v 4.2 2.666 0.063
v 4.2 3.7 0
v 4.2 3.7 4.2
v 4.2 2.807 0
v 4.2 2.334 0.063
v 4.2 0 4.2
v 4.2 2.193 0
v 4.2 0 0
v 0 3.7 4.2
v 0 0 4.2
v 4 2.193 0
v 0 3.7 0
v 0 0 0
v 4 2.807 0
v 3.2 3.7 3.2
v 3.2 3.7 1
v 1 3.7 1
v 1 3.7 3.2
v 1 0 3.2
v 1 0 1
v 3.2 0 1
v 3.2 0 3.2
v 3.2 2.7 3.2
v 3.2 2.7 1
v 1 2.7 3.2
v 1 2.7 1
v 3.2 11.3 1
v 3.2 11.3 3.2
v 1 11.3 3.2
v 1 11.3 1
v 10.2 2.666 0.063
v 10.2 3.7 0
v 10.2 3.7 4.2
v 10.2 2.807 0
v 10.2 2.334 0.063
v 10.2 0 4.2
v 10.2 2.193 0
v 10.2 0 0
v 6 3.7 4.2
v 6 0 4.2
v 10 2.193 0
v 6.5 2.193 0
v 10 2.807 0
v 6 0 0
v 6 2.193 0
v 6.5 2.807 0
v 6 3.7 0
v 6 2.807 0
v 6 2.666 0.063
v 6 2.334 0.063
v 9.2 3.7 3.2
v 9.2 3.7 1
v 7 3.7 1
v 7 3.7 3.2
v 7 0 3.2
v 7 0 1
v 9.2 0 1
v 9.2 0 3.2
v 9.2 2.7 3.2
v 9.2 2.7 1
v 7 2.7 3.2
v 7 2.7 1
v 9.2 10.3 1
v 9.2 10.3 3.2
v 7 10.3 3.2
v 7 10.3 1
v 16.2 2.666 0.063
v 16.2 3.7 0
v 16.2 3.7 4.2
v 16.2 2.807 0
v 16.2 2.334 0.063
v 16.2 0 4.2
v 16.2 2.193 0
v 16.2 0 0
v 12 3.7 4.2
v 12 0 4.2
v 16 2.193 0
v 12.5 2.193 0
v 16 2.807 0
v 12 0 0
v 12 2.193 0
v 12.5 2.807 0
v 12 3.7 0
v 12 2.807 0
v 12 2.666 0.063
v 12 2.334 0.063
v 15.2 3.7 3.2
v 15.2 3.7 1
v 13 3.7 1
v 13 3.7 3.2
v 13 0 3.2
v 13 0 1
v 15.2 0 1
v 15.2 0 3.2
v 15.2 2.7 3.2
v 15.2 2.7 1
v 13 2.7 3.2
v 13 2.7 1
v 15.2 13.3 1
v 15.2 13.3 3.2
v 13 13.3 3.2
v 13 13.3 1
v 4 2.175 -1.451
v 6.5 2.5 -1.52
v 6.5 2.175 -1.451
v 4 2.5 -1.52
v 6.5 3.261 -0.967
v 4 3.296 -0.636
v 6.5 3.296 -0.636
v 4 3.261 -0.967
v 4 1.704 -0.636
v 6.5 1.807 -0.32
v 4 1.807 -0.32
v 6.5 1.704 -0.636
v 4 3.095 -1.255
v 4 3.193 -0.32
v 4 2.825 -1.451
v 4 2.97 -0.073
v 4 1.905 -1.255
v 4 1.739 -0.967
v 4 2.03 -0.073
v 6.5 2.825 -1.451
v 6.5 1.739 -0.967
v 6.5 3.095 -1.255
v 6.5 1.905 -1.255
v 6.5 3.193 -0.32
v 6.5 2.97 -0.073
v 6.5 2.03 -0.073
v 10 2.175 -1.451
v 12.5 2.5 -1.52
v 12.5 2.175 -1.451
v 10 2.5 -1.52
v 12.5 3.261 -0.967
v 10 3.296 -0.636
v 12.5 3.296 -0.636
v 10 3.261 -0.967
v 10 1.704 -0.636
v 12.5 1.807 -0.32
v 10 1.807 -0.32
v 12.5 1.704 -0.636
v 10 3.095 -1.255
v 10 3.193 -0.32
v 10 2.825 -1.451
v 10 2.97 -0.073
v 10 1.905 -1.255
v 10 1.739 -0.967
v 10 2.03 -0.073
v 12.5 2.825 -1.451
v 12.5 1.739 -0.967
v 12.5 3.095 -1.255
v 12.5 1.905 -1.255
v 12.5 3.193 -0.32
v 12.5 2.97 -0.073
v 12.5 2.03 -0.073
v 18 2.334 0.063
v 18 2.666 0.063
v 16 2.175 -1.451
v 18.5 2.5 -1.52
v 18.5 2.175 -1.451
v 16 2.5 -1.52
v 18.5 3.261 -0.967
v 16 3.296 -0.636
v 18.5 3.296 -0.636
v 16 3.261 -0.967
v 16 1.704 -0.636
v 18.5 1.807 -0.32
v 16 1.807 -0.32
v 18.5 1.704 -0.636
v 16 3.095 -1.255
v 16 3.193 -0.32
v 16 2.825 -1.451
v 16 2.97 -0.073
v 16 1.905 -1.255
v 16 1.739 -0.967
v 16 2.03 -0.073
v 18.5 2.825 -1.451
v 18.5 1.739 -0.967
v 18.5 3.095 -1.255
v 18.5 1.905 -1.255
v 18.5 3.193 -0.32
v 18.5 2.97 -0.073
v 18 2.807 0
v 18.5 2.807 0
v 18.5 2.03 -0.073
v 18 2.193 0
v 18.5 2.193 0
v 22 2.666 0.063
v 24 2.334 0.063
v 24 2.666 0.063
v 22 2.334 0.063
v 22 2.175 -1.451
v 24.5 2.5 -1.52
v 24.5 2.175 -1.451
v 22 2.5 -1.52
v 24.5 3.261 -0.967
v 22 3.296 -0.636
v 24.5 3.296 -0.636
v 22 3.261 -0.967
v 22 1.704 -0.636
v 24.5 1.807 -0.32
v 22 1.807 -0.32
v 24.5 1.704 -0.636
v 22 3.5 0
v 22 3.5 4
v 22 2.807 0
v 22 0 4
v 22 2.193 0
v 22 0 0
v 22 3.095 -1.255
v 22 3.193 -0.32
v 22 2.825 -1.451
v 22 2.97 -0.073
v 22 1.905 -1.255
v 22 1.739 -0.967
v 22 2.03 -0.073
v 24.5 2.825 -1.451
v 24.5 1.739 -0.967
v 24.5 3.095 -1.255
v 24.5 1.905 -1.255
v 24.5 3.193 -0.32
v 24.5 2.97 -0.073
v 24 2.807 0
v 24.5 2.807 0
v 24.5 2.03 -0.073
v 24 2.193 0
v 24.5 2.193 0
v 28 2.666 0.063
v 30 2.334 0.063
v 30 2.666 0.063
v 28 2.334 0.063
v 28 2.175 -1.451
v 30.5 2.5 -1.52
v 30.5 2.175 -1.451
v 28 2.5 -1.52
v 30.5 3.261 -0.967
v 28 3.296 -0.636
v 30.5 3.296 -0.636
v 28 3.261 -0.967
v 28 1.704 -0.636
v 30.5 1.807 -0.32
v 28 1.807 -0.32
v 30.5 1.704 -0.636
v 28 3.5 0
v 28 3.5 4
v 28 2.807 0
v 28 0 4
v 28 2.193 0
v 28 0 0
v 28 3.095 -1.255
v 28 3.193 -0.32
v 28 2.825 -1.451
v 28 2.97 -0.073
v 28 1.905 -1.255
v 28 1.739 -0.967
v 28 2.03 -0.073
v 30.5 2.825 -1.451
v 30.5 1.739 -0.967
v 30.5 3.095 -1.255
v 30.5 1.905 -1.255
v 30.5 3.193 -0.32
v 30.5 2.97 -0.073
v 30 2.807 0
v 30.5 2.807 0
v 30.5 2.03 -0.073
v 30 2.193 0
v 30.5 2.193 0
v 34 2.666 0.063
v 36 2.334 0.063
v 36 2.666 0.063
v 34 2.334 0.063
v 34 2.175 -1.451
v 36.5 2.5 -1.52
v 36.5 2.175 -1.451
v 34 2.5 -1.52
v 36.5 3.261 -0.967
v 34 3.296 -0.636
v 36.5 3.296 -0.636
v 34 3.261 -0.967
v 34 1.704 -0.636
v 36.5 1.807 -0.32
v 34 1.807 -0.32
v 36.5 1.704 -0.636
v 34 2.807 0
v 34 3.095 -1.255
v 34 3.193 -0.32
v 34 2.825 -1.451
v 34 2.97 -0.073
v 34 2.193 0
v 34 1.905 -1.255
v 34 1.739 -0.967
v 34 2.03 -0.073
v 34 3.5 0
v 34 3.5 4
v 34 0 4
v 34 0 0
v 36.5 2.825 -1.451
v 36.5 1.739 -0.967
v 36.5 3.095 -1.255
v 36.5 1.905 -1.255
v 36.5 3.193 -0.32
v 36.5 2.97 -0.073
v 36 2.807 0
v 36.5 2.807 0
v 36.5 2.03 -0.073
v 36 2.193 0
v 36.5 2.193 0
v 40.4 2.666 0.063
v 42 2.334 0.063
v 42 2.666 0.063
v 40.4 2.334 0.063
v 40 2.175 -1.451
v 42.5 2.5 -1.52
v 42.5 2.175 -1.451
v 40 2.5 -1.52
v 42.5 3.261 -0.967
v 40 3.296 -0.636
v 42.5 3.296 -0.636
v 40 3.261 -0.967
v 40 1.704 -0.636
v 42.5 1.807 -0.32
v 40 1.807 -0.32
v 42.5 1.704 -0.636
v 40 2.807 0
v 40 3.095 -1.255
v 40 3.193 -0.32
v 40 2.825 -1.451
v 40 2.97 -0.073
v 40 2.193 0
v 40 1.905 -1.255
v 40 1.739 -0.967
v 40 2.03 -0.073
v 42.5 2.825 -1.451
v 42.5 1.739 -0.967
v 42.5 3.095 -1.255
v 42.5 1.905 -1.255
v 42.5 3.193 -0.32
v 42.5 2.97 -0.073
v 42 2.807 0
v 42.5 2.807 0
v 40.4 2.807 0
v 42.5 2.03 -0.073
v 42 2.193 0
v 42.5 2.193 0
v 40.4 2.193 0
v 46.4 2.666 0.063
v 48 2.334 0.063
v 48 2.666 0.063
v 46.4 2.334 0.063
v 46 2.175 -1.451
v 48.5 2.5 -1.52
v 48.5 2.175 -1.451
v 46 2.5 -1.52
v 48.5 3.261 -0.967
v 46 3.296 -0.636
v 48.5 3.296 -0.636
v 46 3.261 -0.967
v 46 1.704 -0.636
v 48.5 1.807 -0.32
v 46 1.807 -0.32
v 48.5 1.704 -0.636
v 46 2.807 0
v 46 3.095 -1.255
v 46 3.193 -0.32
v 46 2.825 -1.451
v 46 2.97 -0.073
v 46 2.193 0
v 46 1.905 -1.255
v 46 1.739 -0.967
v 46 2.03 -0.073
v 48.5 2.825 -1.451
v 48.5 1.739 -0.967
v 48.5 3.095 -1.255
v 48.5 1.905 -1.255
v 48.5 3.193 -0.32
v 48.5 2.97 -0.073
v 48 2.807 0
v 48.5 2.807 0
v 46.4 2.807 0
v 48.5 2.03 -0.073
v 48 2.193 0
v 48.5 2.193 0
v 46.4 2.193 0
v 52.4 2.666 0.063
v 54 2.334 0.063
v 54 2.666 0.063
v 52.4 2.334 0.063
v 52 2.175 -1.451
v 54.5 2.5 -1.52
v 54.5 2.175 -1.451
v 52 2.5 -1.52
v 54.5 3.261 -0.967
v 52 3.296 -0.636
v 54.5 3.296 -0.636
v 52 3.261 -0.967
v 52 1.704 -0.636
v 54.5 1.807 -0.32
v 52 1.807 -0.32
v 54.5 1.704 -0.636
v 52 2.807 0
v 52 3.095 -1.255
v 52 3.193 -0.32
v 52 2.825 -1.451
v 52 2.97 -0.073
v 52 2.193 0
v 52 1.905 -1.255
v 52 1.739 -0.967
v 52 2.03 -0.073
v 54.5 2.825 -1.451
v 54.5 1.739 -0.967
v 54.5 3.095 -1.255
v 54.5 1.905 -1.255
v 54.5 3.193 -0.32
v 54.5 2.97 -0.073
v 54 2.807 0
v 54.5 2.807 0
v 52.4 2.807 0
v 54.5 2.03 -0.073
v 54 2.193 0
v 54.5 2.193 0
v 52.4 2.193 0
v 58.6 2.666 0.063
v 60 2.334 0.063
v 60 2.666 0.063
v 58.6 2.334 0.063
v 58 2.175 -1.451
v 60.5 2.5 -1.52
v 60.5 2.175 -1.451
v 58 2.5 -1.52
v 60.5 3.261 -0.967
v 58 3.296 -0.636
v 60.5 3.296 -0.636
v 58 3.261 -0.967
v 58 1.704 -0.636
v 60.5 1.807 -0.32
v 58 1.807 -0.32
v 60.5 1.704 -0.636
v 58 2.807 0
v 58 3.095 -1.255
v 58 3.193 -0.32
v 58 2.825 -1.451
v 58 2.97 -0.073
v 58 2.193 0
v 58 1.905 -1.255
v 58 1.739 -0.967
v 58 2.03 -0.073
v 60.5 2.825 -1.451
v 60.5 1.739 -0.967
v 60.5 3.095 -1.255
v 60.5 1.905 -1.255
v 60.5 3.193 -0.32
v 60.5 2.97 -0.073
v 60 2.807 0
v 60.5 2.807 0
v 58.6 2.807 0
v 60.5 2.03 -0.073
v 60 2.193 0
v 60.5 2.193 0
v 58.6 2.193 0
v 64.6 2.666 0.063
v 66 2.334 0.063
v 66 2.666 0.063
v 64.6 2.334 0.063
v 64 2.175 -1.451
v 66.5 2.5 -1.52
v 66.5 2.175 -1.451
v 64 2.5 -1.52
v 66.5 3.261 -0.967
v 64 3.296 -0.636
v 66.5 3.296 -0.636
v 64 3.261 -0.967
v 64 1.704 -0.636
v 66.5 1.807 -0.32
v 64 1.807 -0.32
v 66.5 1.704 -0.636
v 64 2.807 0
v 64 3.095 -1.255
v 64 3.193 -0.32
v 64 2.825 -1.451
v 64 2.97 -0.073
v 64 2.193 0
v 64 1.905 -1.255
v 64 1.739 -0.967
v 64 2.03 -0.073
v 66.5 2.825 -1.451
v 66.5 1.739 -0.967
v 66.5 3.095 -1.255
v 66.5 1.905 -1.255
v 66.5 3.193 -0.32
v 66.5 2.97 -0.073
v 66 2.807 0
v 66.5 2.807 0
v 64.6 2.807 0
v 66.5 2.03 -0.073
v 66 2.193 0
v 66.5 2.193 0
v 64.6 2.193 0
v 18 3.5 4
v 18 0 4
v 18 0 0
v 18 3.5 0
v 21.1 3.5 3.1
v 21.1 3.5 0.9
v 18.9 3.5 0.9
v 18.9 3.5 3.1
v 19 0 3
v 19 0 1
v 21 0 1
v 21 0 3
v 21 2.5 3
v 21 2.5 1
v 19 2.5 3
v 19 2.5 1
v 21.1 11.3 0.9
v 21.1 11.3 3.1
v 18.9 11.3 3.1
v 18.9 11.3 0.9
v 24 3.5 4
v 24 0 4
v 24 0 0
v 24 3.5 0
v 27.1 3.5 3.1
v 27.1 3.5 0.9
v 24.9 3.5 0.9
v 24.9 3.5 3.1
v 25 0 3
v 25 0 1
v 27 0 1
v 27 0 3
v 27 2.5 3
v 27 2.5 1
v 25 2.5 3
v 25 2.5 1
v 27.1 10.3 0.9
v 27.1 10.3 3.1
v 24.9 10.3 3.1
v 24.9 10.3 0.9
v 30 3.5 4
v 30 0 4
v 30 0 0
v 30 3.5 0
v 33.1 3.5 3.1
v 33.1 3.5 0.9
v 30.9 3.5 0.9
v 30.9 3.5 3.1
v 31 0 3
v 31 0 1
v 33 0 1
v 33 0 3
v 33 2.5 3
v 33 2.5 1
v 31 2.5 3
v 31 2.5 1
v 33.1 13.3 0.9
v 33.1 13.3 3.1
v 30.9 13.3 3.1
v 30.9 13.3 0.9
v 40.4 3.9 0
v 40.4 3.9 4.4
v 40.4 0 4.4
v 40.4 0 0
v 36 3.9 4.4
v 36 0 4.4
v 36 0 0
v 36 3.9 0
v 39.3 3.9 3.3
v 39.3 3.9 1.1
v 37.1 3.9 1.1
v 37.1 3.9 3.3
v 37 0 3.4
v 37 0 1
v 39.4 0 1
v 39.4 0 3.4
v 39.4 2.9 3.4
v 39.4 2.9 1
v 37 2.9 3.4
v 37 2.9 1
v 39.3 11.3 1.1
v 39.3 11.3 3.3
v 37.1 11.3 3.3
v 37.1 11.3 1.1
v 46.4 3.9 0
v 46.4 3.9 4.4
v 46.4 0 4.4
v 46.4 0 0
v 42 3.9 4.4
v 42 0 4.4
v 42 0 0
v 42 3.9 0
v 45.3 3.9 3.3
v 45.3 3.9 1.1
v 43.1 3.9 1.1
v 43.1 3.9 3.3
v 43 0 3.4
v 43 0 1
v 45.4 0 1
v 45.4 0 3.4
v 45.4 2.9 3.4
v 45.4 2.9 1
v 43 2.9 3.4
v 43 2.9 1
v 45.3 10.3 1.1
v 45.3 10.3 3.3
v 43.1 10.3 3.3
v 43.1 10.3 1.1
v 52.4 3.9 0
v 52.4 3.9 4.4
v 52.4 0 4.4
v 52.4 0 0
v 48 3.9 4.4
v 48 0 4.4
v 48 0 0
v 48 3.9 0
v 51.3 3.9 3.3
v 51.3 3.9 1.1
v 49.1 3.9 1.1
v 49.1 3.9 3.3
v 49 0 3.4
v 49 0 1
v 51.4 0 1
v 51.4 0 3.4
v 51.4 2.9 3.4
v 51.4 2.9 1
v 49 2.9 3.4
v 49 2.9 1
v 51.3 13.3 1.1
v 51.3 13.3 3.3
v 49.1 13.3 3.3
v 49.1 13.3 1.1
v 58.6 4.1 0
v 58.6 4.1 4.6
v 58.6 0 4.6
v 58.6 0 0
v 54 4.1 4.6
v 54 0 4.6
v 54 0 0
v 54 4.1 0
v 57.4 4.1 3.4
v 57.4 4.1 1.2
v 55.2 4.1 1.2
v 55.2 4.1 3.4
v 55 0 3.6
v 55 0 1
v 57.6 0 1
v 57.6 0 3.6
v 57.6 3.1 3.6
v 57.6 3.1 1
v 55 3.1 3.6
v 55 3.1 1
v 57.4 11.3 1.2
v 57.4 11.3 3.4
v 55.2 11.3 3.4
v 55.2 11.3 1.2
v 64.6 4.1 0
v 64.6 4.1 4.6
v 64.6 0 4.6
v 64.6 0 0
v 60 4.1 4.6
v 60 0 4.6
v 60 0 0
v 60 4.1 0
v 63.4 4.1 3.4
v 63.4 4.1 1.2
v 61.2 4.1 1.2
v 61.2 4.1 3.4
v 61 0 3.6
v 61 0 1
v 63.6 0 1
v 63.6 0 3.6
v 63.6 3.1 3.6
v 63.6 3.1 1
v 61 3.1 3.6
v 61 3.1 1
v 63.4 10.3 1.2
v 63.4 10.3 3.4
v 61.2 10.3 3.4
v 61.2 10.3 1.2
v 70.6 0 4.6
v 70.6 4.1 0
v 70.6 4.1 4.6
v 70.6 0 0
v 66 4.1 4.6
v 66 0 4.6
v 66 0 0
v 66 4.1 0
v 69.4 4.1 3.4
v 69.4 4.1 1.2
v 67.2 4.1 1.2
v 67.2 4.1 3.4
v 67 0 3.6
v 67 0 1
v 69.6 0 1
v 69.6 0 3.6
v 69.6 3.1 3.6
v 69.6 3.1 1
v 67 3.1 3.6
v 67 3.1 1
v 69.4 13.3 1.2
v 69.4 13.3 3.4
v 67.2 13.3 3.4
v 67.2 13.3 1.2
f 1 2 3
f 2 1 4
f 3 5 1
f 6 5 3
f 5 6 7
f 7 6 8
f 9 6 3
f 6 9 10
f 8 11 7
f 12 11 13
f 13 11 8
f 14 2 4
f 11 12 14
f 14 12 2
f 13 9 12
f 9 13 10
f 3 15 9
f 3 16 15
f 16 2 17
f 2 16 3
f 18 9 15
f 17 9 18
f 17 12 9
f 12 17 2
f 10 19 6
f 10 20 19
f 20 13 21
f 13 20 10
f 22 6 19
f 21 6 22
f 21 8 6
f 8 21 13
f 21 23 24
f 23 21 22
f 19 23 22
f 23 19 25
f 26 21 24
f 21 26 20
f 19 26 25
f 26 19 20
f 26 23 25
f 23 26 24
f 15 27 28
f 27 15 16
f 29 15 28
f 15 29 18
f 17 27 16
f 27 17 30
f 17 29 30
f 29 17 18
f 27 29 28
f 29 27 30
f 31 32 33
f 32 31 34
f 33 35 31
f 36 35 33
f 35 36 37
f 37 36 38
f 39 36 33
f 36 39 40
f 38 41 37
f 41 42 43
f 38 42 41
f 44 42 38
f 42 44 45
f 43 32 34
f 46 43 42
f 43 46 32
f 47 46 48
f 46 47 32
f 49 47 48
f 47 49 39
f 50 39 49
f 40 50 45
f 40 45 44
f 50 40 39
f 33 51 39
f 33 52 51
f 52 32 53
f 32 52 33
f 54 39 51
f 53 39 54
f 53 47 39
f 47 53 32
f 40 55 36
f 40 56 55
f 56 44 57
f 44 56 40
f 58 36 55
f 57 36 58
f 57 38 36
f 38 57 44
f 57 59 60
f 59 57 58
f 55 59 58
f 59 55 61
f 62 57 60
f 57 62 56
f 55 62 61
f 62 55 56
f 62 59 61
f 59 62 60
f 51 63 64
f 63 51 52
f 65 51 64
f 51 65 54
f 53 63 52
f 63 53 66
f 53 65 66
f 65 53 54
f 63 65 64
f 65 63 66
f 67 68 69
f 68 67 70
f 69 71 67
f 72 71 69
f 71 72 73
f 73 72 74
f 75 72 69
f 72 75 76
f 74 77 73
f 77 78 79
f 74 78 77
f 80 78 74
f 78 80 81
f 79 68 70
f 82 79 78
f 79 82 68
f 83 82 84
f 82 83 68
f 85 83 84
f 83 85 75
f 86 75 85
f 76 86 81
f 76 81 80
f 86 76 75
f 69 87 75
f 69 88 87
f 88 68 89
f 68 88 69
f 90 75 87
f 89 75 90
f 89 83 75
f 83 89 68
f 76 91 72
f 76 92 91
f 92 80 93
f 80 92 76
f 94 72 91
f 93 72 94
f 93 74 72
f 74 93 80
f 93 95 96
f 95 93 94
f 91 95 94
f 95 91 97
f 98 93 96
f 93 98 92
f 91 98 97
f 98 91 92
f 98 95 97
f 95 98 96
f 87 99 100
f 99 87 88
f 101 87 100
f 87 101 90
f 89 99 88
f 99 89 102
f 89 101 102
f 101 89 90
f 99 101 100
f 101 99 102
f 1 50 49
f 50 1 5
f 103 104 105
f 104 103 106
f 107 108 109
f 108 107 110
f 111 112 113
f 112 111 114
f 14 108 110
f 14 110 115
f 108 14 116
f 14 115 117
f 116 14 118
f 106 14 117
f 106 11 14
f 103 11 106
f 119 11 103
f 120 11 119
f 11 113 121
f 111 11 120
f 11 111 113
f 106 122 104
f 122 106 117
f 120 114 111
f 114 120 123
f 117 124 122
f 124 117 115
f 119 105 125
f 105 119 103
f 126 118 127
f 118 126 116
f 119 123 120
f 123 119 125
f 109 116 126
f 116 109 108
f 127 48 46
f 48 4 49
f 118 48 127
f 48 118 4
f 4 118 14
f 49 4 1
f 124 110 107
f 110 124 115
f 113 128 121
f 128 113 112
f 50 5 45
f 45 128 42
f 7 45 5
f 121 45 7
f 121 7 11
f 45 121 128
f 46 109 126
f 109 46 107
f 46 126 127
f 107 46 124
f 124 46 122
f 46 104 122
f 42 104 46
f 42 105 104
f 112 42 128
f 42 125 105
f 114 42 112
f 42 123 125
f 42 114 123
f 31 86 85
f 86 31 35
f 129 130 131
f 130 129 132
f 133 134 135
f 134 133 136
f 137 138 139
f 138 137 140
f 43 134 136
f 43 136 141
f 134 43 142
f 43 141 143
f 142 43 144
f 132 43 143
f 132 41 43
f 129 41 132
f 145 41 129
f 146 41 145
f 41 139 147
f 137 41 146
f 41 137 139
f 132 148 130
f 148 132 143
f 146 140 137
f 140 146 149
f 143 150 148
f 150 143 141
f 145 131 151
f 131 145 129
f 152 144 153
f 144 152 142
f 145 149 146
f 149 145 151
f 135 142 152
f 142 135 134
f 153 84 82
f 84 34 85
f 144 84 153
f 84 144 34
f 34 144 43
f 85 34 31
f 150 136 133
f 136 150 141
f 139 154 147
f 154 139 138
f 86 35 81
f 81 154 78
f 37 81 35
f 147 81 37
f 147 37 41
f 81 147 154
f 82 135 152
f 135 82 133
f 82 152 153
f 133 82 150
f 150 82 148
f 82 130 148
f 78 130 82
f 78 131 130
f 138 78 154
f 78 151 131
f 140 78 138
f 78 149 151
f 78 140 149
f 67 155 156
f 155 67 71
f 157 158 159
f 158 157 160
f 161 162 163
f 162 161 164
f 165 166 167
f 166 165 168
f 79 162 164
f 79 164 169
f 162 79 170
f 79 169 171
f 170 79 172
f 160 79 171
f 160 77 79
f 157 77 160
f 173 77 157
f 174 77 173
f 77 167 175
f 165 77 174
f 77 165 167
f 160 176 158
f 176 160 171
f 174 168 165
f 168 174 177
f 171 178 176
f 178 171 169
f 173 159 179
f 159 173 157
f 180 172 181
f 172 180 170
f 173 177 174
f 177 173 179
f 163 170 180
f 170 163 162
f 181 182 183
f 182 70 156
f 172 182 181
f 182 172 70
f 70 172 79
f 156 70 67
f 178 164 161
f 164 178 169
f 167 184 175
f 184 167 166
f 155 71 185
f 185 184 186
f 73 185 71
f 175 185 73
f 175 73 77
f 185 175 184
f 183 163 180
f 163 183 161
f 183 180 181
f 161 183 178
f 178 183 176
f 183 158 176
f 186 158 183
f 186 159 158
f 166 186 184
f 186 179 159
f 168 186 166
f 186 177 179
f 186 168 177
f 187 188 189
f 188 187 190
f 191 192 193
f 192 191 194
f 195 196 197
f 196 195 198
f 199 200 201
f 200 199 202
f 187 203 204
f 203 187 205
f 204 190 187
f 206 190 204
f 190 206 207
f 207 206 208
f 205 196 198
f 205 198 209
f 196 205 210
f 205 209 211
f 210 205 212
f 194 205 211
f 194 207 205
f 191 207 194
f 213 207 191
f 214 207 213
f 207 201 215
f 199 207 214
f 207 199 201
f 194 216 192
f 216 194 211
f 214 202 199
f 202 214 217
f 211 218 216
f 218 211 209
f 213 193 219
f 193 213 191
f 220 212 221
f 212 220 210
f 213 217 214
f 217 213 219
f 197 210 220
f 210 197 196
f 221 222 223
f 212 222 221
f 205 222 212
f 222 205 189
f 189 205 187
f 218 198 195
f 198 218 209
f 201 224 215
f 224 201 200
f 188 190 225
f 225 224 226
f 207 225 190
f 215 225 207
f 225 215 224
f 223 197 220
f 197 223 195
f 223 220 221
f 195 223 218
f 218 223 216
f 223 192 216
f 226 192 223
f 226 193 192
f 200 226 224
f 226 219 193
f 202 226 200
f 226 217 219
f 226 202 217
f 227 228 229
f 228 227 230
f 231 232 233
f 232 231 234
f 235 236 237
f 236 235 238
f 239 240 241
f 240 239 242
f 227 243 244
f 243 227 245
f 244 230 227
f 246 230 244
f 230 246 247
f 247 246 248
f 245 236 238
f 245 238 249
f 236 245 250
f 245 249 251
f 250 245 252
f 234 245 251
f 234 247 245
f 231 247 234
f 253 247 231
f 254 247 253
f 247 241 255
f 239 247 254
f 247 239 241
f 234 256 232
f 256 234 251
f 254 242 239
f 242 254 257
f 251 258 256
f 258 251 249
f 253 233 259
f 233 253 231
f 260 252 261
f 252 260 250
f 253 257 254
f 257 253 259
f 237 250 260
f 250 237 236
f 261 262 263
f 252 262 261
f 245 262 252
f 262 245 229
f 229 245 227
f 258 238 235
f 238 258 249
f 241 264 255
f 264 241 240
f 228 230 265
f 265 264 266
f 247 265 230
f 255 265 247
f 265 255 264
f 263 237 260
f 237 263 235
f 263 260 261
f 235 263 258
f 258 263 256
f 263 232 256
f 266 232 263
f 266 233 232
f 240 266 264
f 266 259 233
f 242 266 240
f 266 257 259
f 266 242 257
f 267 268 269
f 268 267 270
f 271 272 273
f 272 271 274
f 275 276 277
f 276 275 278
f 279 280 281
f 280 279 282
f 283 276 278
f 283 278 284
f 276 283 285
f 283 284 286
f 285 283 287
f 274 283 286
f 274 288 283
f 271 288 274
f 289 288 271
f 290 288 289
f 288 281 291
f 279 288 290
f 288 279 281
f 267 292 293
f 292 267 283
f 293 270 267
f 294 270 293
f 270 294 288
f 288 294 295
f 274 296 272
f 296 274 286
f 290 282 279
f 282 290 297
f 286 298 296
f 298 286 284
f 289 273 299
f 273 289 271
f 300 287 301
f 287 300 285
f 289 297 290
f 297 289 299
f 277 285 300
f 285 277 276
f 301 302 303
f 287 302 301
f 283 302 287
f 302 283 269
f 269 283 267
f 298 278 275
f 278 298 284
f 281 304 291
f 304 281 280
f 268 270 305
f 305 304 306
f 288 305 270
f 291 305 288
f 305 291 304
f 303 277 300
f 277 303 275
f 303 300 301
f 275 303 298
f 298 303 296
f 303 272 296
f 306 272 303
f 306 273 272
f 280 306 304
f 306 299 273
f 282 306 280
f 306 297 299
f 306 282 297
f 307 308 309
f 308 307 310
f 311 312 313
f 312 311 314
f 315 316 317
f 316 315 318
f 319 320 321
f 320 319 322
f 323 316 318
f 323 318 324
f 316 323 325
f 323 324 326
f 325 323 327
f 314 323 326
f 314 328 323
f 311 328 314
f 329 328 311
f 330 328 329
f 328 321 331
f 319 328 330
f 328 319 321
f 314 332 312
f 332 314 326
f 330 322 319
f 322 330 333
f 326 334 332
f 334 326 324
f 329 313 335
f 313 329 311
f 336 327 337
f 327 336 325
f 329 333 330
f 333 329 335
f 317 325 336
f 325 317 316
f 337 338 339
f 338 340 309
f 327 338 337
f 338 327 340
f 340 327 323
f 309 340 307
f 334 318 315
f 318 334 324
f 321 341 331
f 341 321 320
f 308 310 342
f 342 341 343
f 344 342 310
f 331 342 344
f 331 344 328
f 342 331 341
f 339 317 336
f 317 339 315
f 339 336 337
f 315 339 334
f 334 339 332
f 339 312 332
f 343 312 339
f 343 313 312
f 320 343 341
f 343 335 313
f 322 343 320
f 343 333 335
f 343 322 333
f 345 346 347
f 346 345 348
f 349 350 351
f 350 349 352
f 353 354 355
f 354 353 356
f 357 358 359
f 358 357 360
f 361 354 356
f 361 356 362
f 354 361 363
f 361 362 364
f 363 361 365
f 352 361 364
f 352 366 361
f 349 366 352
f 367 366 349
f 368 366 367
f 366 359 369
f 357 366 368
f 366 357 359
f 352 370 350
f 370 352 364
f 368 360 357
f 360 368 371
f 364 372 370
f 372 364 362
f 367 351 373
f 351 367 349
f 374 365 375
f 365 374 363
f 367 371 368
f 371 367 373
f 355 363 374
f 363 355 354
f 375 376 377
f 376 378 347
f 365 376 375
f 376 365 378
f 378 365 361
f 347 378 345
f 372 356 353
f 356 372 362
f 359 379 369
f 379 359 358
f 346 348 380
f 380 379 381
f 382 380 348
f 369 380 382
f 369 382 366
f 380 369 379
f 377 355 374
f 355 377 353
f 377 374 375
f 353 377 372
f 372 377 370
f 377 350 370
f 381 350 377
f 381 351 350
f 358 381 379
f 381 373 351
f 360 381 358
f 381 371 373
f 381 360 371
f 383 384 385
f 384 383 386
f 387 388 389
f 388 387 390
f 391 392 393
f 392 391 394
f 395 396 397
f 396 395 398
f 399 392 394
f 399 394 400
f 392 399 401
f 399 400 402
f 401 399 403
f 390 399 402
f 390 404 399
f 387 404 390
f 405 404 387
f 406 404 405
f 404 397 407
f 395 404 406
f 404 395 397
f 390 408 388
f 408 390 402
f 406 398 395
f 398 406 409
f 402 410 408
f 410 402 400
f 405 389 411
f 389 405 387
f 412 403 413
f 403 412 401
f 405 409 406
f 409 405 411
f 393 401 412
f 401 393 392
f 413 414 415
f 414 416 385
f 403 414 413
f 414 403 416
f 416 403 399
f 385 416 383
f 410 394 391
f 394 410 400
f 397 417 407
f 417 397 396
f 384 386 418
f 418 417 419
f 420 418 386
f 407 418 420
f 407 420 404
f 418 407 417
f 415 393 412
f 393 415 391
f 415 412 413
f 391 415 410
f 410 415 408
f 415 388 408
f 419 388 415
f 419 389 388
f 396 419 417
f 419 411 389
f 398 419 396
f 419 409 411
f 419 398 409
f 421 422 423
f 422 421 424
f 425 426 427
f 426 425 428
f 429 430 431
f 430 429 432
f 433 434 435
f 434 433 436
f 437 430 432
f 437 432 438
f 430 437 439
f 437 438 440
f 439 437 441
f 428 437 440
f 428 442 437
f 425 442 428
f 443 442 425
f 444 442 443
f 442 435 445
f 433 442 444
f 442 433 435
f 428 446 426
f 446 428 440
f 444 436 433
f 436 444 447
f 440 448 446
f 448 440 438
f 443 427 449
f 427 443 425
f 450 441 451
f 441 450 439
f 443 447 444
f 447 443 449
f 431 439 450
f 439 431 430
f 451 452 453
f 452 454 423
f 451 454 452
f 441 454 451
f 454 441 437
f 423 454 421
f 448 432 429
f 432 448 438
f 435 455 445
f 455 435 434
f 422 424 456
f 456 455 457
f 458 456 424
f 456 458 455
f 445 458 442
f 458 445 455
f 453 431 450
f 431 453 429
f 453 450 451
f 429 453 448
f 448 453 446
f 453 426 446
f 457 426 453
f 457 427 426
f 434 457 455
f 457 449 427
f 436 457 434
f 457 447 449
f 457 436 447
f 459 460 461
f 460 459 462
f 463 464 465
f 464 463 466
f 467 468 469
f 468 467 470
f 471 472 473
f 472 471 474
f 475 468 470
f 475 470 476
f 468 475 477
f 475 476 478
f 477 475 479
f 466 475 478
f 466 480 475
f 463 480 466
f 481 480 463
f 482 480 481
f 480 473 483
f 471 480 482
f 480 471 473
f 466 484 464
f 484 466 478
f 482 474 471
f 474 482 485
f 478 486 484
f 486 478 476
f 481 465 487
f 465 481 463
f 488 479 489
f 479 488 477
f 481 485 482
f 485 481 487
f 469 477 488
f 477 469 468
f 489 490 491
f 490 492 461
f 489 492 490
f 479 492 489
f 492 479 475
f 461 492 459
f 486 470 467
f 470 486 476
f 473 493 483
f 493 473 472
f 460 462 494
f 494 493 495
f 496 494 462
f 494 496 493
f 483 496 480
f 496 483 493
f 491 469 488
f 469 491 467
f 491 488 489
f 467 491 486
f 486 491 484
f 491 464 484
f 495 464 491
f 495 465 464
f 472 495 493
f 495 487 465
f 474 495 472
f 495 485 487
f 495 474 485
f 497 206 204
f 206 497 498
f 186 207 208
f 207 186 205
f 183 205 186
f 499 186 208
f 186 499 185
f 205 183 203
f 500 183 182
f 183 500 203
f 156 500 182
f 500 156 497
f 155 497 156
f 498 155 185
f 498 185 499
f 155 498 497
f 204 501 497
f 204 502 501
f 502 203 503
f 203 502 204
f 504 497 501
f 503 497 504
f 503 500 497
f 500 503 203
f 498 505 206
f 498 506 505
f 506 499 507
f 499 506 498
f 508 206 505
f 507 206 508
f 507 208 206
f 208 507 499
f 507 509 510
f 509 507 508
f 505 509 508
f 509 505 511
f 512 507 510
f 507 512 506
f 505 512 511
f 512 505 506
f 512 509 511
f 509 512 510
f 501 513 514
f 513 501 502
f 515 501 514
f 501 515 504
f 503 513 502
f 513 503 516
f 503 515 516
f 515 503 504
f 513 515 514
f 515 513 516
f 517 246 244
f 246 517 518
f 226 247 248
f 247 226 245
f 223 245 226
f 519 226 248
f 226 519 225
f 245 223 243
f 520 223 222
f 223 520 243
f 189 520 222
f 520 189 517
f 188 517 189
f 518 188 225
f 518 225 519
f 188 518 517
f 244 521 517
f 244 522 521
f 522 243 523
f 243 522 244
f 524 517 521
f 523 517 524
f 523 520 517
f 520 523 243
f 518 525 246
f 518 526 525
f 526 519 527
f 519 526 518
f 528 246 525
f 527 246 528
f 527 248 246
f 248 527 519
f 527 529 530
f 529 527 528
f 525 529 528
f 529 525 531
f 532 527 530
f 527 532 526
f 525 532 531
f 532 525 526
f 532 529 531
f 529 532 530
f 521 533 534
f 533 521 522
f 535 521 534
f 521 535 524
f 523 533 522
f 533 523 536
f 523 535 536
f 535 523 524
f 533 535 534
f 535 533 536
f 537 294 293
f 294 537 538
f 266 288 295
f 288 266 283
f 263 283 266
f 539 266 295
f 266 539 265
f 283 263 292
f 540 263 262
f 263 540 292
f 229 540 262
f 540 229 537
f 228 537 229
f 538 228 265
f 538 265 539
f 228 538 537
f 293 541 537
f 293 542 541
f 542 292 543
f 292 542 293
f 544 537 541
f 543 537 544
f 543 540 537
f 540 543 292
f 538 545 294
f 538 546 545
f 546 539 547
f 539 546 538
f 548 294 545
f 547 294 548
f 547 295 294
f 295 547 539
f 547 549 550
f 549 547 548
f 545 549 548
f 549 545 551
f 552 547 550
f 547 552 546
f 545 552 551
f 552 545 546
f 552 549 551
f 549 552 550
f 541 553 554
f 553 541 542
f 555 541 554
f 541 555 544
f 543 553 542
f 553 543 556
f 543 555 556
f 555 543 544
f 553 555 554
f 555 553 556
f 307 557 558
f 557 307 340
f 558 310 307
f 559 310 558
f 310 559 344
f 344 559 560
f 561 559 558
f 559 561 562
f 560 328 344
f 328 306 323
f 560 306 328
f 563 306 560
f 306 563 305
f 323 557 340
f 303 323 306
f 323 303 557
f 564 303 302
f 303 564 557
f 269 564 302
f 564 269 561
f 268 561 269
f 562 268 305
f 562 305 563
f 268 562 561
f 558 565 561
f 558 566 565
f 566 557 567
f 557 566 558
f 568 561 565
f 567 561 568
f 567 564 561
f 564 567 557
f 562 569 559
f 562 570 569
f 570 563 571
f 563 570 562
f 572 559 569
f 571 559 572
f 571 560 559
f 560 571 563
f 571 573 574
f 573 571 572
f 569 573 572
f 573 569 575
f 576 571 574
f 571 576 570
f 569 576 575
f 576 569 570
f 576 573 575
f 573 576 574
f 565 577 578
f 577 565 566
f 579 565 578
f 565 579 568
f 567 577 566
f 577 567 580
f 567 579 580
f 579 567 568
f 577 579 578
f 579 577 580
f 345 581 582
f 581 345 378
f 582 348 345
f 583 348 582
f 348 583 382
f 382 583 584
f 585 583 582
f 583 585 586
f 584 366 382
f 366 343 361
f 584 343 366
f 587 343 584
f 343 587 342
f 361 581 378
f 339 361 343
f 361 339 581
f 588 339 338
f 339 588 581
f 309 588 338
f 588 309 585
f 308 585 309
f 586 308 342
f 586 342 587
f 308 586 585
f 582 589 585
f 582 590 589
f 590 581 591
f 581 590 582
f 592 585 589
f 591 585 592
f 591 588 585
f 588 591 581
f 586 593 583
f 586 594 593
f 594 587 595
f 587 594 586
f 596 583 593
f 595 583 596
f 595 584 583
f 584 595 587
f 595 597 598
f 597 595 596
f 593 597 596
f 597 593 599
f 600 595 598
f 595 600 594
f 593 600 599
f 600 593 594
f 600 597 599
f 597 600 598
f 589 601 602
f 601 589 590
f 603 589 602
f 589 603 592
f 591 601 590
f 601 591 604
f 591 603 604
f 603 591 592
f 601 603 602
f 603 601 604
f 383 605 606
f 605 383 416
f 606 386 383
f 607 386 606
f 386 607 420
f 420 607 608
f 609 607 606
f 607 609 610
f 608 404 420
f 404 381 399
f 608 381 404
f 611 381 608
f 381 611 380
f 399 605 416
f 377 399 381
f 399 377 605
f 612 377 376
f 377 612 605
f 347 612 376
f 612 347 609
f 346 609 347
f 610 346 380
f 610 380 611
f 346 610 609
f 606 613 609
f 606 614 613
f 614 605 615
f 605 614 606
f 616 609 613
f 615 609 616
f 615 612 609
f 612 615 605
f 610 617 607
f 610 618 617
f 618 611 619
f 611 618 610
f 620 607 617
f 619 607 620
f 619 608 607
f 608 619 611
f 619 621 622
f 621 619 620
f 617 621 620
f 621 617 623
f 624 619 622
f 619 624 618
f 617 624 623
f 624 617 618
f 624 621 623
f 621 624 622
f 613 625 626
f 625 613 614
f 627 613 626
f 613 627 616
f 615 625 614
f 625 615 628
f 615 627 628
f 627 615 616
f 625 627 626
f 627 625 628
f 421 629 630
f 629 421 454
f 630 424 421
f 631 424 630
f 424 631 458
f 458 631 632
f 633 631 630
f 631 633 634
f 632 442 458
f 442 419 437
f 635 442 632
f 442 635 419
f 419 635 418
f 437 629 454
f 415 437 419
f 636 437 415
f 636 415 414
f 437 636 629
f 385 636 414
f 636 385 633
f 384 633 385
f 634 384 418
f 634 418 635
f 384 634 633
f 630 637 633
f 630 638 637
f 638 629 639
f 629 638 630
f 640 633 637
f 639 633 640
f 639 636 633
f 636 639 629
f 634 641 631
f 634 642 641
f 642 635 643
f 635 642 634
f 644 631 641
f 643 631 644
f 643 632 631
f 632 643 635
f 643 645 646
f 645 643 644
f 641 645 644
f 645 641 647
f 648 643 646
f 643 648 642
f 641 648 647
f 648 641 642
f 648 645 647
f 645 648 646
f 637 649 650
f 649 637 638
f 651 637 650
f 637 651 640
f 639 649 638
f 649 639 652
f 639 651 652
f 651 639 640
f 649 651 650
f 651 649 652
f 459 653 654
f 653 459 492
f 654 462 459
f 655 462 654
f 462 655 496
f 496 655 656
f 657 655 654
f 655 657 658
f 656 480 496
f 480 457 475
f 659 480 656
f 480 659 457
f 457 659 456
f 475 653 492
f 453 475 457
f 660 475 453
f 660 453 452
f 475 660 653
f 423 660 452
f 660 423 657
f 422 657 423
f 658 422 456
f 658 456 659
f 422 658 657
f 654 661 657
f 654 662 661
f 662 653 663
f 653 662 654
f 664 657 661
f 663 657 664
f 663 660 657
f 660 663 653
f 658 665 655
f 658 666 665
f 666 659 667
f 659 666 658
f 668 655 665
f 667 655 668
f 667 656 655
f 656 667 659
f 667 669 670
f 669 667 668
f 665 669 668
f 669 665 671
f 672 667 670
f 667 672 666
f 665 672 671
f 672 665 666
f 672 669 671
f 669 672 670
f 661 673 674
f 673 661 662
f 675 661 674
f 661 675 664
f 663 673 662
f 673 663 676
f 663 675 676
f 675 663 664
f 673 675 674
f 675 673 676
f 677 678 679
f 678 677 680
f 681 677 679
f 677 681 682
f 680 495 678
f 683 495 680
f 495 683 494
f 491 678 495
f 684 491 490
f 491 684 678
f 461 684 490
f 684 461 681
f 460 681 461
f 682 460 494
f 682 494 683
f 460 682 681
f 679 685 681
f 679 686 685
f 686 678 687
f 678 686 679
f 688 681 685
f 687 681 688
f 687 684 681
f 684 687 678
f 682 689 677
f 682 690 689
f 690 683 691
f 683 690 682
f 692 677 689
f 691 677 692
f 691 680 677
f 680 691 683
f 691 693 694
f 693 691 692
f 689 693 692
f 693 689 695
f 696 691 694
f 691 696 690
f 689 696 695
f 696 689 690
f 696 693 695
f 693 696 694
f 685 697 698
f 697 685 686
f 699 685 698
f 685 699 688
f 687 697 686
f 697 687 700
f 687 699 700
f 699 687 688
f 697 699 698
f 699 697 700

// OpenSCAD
// file: trackpoint_extension.scad
// Overlap Buffer for cutting
ovb = 0.01;

module draw_trackpoint_extension(stem_width, stem_height, extension_height, wall_thickness=1, tolerance_adjustment=0) {

    echo(str("Building TP extension with ", extension_height, "mm height"));

    stem_adapter_w = stem_width + wall_thickness * 2 + tolerance_adjustment;
    stem_adapter_h = stem_height + wall_thickness + tolerance_adjustment;

    hole_w = stem_width + tolerance_adjustment;
    hole_h = stem_height + tolerance_adjustment;
    hole_offset = (stem_adapter_w - hole_w) / 2;

    extension_w = stem_width;
    extension_h = extension_height - stem_adapter_h;
    extension_offset = (stem_adapter_w - extension_w) / 2;

    // Top extension
    translate([+extension_offset, +stem_adapter_h, +extension_offset])
        cube([extension_w, extension_h, extension_w]);

    difference() {
        // Adapter
        translate([0, 0, 0])
            cube([stem_adapter_w, stem_adapter_h, stem_adapter_w]);

        // Hole
        translate([hole_offset, -ovb, hole_offset])
            cube([hole_w, hole_h + ovb, hole_w]);
    };
}
// file: export_tp_red_t460s.scad
use <trackpoint_extension.scad>

// Parameters
wall_thickness = 1;
tolerance_adjustment = 0;
height_adjustment=0;

// TP Stem dimensions
stem_width = 2.2;
stem_height = 2.7;

// TP dot dimensions
tp_dot_height_total = 4;
tp_dot_height_hole = 2.8;
tp_dot_height = tp_dot_height_total - tp_dot_height_hole;

// Height from pcb bottom to choc keycap top
keycap_height = 12.5;

// The final desired height for the extension
extension_height = keycap_height - tp_dot_height;

module draw_tp_ext_red_t460s(tolerance_adjustment=tolerance_adjustment, height_adjustment=height_adjustment, wall_thickness=wall_thickness) {

    draw_trackpoint_extension(
        stem_width,
        stem_height,
        extension_height + height_adjustment,
        wall_thickness=wall_thickness,
        tolerance_adjustment=tolerance_adjustment
    );
}

draw_tp_ext_red_t460s(tolerance_adjustment, height_adjustment, wall_thickness);
// main file
use <export_tp_red_t460s.scad>

tolerance_adjustments = [
    0,
    -0.2,
    0.2,
    0.4,
];

height_adjustments = [
    0,
    -1,
    2,
];

spacing = 6;

sprue_len=2.5;
sprue_radius=0.8;

for (i = [0 : len(tolerance_adjustments) - 1]) {
    tolerance_adjustment = tolerance_adjustments[i];

    for (j = [0 : len(height_adjustments) - 1]) {
        height_adjustment = height_adjustments[j];

        spacing_offset = (i * len(height_adjustments) + j) * spacing;
        translate([spacing_offset, 0, 0])
            draw_tp_ext_red_t460s(
                tolerance_adjustment,
                height_adjustment
            );
    }

    count = len(tolerance_adjustments) * len(height_adjustments);
    for (i = [0 : count - 2]) {
        translate([
            (i + 1) * spacing - 2,
            +2.5,
            - 0.9 * sprue_radius
        ])
            rotate ([0, 90, 0])
                cylinder(
                    h = sprue_len,
                    r = sprue_radius,
                    $fn=15
                );
    }
}
